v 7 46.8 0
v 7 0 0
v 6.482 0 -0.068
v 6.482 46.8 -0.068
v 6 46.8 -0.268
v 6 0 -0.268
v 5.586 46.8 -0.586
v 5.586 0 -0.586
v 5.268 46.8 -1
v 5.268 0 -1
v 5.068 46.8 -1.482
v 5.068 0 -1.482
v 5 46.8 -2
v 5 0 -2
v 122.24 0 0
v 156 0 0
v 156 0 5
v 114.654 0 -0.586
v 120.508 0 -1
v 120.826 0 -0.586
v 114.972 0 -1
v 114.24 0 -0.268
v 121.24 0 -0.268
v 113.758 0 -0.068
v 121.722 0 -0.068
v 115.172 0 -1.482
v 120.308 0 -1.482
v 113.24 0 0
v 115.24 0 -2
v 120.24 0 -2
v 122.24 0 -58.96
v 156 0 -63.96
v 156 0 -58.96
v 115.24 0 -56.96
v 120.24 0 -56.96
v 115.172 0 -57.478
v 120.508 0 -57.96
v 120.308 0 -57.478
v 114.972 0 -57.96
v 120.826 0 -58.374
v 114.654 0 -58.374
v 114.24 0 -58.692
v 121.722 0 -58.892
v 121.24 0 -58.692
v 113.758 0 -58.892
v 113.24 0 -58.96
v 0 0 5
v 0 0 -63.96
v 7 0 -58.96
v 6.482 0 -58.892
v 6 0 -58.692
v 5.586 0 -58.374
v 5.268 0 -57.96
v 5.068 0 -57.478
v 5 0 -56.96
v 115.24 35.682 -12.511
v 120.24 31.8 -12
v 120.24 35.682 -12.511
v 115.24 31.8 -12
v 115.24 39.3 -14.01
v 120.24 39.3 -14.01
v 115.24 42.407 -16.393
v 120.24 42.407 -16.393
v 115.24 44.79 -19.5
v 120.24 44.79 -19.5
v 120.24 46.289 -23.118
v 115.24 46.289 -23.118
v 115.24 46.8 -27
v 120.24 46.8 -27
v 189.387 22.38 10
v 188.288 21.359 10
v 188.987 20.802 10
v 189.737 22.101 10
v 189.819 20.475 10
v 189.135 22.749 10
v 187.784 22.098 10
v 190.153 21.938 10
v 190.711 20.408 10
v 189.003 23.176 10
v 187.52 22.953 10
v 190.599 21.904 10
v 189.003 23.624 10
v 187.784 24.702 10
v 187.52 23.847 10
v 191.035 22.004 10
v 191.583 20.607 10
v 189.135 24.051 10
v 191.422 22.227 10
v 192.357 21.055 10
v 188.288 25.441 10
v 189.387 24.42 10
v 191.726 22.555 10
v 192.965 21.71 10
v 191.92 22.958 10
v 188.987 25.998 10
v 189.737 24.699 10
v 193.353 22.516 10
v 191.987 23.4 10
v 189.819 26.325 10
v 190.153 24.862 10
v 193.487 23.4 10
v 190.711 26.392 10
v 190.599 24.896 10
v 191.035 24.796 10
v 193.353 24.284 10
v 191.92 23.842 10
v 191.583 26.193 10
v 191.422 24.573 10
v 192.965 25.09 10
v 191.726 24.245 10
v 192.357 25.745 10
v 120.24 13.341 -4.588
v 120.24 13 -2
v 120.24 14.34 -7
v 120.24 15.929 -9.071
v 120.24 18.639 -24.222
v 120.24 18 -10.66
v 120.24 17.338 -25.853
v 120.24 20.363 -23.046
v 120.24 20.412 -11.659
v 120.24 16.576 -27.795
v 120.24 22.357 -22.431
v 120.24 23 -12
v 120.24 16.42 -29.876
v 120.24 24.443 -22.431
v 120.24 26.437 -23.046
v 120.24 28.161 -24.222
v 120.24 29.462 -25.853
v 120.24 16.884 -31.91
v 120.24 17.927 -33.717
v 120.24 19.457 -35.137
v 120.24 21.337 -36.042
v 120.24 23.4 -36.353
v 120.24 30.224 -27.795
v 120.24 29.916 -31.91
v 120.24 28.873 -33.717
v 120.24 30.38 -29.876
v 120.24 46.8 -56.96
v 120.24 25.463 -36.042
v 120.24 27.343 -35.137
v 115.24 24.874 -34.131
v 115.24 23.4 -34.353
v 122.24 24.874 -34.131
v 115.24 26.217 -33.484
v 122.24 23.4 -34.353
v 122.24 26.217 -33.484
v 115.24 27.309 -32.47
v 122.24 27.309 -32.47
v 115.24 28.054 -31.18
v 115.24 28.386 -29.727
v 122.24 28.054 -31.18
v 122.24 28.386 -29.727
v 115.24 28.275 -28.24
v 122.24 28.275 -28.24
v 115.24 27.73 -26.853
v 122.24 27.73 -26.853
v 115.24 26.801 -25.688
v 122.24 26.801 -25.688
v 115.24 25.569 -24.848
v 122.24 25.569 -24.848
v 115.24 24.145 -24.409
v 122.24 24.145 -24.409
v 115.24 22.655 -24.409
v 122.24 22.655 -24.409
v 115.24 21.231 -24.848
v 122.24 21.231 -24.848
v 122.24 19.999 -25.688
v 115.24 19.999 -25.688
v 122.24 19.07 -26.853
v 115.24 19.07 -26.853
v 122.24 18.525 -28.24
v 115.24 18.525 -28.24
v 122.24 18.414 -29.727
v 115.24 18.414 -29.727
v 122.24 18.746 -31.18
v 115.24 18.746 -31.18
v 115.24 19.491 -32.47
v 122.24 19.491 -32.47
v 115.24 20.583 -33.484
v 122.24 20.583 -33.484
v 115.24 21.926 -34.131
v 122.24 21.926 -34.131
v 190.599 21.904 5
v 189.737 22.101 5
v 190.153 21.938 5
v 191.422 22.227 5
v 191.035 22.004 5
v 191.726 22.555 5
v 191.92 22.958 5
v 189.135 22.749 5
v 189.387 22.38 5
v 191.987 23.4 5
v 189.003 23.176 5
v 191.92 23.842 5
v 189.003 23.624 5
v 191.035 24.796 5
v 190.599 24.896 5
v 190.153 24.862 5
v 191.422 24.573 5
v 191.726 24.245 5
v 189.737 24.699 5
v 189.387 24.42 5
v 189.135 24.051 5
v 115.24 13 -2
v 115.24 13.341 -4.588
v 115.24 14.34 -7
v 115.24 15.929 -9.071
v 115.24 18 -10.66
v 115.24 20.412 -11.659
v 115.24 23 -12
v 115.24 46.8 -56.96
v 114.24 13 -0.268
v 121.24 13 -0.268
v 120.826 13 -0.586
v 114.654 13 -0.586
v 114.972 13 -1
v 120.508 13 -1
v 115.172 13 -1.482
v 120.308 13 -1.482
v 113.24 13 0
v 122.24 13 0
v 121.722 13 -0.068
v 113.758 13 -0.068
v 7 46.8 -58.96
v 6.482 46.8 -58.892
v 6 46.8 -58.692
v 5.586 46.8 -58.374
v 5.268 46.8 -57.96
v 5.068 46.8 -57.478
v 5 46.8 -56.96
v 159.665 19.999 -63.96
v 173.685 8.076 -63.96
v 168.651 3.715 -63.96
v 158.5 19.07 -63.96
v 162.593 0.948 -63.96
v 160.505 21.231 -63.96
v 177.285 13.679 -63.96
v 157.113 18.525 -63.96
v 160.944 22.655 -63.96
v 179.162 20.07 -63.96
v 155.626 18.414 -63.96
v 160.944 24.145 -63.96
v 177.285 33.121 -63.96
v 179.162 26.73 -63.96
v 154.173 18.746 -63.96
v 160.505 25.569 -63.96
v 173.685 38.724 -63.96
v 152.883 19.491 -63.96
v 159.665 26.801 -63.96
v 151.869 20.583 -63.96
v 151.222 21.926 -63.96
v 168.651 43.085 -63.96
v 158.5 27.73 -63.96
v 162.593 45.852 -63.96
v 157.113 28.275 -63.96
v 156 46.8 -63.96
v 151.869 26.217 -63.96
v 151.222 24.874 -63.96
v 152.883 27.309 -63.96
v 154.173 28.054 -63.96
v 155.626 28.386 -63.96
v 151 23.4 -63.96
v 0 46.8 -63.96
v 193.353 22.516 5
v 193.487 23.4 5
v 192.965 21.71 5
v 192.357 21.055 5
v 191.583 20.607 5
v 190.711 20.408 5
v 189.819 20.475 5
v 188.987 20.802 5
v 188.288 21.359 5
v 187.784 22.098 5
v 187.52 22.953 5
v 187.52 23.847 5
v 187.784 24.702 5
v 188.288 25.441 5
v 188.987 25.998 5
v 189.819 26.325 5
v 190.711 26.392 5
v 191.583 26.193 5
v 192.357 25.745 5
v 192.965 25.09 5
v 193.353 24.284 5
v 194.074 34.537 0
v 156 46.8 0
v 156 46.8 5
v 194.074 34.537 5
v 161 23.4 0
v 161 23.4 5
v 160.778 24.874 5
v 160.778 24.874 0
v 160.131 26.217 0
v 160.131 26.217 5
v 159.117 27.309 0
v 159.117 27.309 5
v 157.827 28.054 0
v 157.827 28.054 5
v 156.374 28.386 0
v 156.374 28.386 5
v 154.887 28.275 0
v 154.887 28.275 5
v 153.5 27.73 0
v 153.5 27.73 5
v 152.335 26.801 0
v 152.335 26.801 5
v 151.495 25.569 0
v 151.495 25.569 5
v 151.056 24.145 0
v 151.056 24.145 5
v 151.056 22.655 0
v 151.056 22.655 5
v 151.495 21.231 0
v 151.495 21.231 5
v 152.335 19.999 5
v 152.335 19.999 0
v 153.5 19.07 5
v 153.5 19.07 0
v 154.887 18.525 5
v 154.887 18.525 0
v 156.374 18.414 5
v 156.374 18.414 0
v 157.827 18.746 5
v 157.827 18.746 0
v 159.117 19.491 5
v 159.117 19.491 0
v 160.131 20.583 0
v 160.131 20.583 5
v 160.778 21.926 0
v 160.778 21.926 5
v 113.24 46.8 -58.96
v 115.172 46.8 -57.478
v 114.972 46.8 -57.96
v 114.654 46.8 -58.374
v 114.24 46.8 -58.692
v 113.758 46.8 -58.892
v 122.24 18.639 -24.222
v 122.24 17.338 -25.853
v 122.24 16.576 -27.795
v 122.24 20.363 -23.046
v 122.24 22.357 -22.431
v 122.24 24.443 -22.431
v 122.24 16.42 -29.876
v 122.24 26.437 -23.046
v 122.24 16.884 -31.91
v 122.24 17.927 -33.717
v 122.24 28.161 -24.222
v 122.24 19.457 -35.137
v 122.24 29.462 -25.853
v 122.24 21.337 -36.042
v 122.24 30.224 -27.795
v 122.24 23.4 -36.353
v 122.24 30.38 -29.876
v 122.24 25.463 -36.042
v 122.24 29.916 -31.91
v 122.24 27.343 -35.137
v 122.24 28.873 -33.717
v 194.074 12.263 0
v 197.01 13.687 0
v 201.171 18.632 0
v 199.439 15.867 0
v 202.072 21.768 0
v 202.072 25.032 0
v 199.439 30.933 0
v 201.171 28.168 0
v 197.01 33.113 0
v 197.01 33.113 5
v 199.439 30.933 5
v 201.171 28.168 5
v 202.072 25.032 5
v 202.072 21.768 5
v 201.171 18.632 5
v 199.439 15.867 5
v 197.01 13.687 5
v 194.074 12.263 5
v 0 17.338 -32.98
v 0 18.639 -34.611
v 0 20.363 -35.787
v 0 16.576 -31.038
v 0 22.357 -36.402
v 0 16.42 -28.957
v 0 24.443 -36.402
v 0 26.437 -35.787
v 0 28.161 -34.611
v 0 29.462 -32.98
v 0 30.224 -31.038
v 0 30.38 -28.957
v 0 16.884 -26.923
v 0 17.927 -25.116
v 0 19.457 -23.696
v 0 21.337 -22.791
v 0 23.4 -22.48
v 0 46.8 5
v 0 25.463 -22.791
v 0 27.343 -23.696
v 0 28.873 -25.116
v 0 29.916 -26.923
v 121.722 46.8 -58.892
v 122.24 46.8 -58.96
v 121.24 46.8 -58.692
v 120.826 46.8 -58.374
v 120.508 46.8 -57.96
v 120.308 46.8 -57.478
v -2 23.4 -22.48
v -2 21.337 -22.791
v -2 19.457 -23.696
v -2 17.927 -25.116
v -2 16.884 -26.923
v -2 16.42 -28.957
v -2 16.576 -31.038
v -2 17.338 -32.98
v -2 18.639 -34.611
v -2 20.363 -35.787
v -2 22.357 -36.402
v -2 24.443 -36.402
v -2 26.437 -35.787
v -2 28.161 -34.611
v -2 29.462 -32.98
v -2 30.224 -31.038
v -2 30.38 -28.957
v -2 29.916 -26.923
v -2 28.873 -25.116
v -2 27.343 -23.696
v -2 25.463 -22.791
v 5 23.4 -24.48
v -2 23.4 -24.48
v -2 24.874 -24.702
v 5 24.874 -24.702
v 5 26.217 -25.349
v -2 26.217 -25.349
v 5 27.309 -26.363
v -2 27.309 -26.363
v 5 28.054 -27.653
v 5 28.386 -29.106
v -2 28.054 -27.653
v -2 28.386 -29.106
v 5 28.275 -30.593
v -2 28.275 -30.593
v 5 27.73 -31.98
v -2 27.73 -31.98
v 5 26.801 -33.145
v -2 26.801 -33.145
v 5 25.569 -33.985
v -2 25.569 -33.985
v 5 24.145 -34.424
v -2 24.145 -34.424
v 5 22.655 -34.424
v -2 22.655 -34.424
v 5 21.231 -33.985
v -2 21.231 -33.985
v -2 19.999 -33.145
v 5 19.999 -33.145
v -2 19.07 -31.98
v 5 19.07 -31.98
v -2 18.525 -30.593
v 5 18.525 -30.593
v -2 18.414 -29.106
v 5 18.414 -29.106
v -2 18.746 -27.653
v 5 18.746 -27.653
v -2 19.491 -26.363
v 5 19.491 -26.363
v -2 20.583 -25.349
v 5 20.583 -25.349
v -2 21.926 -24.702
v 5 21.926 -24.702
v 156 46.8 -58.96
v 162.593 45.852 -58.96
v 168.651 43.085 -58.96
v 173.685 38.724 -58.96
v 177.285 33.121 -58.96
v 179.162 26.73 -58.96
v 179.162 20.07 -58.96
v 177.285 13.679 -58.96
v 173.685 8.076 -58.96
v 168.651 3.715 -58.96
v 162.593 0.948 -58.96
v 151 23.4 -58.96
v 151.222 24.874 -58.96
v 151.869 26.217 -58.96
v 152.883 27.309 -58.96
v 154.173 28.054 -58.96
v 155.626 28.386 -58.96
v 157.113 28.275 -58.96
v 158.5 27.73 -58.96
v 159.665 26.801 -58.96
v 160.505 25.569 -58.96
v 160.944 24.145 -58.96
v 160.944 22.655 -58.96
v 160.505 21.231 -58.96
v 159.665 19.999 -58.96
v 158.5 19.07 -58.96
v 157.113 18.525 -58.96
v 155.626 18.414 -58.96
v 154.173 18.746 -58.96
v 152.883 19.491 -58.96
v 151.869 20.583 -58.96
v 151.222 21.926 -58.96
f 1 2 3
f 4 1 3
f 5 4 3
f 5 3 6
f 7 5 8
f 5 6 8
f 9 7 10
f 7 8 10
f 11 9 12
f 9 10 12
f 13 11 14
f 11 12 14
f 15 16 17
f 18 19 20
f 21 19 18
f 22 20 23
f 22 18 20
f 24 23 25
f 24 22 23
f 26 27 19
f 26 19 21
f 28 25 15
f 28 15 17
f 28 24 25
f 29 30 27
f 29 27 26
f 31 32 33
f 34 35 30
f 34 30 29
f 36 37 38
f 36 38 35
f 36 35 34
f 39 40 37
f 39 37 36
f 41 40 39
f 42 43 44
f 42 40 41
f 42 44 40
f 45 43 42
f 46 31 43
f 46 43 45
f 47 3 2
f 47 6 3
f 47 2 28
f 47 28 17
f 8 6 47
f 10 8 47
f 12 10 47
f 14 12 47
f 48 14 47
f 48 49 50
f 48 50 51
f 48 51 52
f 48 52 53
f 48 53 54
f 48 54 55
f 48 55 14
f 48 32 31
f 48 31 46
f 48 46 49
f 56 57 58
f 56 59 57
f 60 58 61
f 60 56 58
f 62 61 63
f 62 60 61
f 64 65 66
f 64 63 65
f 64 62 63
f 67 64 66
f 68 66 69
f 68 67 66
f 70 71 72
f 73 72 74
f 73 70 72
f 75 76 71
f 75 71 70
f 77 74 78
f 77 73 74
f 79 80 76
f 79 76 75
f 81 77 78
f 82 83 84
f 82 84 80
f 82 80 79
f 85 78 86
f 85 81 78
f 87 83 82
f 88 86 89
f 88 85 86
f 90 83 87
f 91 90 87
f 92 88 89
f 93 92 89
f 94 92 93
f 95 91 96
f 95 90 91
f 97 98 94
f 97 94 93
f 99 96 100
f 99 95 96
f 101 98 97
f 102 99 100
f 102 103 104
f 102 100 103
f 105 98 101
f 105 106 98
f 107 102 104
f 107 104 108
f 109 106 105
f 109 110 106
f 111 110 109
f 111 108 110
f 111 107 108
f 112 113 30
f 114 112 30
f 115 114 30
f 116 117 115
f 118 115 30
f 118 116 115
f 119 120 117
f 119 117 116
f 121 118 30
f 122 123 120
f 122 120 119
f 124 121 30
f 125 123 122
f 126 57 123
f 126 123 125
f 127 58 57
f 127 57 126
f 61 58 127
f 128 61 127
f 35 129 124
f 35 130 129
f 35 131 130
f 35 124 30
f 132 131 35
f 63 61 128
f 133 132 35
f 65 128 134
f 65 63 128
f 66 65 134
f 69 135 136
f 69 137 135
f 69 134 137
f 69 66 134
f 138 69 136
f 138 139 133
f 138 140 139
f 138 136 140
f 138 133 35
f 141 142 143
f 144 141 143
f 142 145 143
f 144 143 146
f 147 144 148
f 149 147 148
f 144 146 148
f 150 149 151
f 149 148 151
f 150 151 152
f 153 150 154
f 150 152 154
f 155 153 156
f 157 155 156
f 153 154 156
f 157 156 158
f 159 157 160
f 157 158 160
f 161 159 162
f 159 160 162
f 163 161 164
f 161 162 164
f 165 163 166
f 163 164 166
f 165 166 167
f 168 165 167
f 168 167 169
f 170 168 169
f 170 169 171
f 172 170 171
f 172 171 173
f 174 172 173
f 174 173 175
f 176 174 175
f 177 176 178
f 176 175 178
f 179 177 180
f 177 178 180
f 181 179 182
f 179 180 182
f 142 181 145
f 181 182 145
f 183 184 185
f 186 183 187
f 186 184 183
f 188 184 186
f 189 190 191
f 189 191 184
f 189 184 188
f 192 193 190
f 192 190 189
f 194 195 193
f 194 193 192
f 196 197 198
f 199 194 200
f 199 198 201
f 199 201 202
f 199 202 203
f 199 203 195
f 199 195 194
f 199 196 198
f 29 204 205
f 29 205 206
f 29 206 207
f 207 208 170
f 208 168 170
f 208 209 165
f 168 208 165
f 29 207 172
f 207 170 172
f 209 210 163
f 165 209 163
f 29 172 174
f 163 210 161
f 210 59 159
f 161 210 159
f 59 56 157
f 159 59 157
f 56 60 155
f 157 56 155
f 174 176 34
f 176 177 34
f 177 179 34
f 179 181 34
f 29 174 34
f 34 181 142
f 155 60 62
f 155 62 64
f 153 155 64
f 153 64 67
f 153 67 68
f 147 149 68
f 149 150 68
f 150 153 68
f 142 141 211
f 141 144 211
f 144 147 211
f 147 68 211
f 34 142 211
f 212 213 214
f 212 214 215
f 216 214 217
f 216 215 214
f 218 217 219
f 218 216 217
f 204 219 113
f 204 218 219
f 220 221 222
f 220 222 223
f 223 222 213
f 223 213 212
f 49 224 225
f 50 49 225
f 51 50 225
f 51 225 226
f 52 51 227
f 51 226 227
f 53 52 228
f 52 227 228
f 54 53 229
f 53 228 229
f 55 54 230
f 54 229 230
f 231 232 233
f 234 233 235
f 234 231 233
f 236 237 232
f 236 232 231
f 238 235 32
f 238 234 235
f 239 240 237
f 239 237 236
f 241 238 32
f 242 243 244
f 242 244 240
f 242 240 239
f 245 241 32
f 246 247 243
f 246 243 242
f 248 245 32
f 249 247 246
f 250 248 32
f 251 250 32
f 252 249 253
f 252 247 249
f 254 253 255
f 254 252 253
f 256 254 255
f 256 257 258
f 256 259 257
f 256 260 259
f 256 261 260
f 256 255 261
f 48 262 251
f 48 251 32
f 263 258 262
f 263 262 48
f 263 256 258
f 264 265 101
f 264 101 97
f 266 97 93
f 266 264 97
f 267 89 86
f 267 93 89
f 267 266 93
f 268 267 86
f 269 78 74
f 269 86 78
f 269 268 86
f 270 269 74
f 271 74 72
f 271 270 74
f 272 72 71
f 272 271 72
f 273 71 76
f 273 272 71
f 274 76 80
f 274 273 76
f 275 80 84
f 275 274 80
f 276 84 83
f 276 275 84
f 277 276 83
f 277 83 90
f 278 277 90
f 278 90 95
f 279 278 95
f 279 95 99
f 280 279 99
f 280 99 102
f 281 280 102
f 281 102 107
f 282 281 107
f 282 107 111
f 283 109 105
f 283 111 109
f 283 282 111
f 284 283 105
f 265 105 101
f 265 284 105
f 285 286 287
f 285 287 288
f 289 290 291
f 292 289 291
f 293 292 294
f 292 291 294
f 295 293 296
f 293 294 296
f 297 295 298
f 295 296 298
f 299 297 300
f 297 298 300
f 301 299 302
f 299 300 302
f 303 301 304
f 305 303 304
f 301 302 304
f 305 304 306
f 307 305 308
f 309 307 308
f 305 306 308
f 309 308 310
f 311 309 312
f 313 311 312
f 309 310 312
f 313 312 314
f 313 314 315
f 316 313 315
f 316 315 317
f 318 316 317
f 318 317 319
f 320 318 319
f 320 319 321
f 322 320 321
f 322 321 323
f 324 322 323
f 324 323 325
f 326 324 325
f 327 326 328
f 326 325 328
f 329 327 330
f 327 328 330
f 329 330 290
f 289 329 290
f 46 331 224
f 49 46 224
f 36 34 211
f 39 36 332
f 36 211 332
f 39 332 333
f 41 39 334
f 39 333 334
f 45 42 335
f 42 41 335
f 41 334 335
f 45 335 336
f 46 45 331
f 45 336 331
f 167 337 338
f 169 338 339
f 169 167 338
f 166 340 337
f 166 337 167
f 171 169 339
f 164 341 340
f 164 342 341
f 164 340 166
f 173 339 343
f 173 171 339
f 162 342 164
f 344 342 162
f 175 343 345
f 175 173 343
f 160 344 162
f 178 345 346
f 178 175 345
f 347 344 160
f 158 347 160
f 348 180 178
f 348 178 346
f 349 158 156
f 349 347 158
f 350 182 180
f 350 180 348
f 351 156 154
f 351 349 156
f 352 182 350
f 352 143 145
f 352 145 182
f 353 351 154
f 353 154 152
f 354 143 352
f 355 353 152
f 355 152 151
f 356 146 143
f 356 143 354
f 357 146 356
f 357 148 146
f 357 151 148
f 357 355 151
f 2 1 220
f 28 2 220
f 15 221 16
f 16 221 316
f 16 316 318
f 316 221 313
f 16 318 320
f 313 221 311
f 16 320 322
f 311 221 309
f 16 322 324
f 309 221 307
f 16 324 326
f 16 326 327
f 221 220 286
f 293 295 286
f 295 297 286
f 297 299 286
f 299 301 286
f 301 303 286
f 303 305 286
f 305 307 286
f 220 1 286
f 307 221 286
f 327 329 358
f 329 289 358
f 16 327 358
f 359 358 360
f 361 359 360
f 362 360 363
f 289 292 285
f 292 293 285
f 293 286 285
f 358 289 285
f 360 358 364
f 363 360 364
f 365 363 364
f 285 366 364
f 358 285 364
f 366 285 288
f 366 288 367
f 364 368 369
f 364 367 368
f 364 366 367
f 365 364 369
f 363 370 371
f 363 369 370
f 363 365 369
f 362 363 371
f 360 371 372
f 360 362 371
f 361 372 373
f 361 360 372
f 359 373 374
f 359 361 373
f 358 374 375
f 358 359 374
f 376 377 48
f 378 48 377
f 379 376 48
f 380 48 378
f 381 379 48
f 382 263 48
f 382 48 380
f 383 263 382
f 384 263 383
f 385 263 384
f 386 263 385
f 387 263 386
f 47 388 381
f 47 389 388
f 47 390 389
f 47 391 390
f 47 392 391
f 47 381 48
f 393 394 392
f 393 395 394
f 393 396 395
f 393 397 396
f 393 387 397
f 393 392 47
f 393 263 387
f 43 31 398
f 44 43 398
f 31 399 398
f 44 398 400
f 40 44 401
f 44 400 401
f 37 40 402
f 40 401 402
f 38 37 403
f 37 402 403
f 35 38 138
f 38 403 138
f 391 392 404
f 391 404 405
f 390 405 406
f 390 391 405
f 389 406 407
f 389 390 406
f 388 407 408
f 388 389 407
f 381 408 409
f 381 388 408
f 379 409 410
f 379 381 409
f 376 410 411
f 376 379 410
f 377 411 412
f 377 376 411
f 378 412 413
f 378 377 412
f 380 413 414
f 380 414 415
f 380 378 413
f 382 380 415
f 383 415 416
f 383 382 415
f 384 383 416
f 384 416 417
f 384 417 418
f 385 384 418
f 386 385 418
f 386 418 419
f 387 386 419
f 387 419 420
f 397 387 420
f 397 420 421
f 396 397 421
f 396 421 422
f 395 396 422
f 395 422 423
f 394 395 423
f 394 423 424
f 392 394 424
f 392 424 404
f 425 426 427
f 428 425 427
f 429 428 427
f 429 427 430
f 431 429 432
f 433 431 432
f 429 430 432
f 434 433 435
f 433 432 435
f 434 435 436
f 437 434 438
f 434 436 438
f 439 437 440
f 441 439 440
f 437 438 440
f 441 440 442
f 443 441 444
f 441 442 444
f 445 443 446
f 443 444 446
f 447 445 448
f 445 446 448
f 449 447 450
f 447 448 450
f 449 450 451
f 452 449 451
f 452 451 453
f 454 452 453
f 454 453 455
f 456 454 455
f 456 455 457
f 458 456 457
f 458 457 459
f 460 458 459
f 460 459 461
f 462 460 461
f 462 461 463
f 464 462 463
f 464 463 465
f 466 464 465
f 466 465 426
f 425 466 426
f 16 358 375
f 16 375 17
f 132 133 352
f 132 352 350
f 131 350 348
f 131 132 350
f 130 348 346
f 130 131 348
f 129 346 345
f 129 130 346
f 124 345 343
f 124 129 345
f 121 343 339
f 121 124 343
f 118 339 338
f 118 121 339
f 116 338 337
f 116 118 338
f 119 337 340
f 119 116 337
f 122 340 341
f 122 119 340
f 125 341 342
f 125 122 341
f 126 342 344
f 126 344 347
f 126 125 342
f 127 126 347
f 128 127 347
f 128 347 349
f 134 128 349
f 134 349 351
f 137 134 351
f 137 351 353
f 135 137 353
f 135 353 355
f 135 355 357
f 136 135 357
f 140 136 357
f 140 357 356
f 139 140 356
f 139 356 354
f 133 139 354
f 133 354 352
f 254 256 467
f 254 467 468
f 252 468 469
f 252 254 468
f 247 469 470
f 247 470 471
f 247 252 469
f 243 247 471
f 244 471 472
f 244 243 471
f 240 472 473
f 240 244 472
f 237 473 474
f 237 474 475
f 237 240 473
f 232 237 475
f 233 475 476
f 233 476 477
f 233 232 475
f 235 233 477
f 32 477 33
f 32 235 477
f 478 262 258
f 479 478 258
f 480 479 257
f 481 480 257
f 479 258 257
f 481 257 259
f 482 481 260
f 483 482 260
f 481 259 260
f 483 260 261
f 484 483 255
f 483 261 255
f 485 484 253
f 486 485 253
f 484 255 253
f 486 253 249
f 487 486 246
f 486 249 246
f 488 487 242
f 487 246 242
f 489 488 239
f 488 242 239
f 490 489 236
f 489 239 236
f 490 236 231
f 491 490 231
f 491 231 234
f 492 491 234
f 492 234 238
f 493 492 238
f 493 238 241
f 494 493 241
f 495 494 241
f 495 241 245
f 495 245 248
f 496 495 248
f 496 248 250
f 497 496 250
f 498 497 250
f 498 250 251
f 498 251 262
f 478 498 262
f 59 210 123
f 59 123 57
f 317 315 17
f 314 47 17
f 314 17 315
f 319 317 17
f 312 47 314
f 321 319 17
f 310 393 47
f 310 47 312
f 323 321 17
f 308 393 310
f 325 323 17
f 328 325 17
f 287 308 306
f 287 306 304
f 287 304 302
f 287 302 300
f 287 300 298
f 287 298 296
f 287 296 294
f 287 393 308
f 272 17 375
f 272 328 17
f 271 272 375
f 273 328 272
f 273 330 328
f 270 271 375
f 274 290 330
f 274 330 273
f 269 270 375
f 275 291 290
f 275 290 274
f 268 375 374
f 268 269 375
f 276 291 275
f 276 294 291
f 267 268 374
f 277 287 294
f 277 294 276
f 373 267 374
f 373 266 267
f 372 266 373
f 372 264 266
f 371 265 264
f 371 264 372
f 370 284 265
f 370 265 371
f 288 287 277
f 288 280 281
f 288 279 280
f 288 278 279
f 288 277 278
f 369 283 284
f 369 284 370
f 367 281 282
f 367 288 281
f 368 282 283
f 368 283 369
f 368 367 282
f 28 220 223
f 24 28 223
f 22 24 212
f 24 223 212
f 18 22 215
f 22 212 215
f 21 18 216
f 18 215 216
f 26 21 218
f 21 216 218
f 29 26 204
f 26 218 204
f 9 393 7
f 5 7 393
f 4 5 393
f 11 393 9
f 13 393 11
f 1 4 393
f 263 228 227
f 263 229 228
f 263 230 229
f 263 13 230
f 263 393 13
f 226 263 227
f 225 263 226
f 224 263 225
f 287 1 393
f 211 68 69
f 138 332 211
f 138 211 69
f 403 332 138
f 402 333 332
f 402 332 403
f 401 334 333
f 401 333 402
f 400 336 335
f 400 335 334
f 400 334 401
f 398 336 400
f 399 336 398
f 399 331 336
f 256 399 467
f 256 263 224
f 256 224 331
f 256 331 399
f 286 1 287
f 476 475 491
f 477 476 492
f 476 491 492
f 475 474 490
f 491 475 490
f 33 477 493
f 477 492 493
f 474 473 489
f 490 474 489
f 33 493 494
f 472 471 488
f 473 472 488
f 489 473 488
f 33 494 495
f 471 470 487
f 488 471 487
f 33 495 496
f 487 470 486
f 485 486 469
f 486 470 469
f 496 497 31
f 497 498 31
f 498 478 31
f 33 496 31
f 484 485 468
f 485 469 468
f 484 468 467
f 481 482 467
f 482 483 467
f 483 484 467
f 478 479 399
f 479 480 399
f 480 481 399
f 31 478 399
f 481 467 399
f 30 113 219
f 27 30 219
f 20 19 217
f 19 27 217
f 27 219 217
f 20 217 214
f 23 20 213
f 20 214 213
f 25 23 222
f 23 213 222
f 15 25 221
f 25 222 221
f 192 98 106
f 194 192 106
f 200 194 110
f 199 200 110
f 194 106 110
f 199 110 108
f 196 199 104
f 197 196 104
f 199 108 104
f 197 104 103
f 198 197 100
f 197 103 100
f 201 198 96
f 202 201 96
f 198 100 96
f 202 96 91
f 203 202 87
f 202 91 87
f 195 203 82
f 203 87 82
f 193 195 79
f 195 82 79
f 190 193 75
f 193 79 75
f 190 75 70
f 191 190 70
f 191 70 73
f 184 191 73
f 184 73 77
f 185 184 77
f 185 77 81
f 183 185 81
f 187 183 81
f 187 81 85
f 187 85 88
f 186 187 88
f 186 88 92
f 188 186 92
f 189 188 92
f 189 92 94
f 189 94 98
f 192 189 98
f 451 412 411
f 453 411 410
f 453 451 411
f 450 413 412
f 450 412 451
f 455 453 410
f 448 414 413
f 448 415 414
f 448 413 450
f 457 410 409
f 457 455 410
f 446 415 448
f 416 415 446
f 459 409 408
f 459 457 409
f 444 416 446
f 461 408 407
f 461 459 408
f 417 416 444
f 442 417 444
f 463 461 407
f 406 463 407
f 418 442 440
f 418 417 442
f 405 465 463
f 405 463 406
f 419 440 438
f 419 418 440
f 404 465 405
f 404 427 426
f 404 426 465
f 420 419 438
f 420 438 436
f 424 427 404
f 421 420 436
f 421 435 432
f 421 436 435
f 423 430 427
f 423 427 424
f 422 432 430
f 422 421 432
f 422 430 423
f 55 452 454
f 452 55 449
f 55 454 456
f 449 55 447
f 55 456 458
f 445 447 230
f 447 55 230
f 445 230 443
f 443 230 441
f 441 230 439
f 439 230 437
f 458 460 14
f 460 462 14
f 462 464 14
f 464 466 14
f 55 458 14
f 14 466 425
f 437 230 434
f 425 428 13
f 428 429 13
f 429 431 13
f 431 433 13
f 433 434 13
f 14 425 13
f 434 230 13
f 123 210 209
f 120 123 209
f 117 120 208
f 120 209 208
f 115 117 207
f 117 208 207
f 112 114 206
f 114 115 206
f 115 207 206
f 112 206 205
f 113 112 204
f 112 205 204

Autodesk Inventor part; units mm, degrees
ref_plane "YZ Plane" through (0, 0, 0) normal (1, 0, 0) x (0, 1, 0)
ref_plane "XZ Plane" through (0, 0, 0) normal (0, 1, 0) x (-1, 0, 0)
ref_plane "XY Plane" through (0, 0, 0) normal (0, 0, 1) x (1, 0, 0)
sketch "Esquisse1" plane through (0, 0, 0) normal (0, 0, 1) x (1, 0, 0)
  point P0 (0, 0)
sketch "Esquisse2" plane through (0, 0, 0) normal (0, 0, 1) x (1, 0, 0)
  line L0 (0, 0) -> (156, 0)
  line L1 (0, 46.8) -> (0, 0)
  line L2 (194.0737, 12.2634) -> (156, 0)
  arc A0 (194.0737, 12.2634) -> (194.0737, 34.5366) centre (190.4867, 23.4) ccw
  line L3 (0, 46.8) -> (156, 46.8)
  line L4 (156, 46.8) -> (194.0737, 34.5366)
  dimension "d0" = 156
  dimension "d1" = 46.8
  dimension "d2" = 11.7
  dimension "d4" = 40
  dimension "d6" = 40
extrude "Extrusion1" add sketch "Esquisse2" along normal blind 5
sketch "Esquisse3" plane through (0, 0, 5) normal (0, 0, 1) x (1, 0, 0)
  line L0 (194.0737, 34.5366) -> (156, 46.8) projected
  line L1 (156, 46.8) -> (156, 0)
  circle A0 centre (156, 23.4) radius 5
  point P0 (0, 0)
  dimension "d11" = 23.4
  dimension "d12" = 10
extrude "Extrusion2" cut sketch "Esquisse3" against normal blind 5
sketch "Esquisse4" plane through (0, 0, 5) normal (0, 0, 1) x (1, 0, 0)
  point P0 (0, 0)
sketch "Esquisse5" plane through (0, 0, 5) normal (0, 0, 1) x (1, 0, 0)
  arc A0 (194.0737, 12.2634) -> (194.0737, 34.5366) centre (190.4867, 23.4) ccw projected
  circle A1 centre (190.4867, 23.4) radius 3
  point P0 (0, 0)
  point P1 (194.0737, 12.2634)
  dimension "d17" = 6
extrude "Extrusion3" add sketch "Esquisse5" along normal blind 5
sketch "Esquisse6" plane through (190.4867, 23.4, 10) normal (0, 0, 1) x (1, 0, 0)
  circle A0 centre (0, 0) radius 1.5
  point P0 (-190.4867, -23.4)
  dimension "d20" = 3
extrude "Extrusion4" cut sketch "Esquisse6" against normal blind 5
sketch "Esquisse7" plane through (0, 0, 0) normal (-1, 0, 0) x (0, 0, 1)
  line L0 (0, 0) -> (-63.96, 0)
  line L1 (-63.96, 0) -> (-63.96, 46.8)
  line L2 (-63.96, 46.8) -> (0, 46.8)
  line L3 (0, 46.8) -> (0, 0)
  dimension "d23" = 63.96
  dimension "d24" = 46.8
extrude "Extrusion5" add sketch "Esquisse7" against normal blind 5
sketch "Esquisse8" plane through (0, 0, 5) normal (-1, 0, 0) x (0, 0, 1)
  line L0 (-68.96, 46.8) -> (0, 46.8) projected
  line L1 (-68.96, 46.8) -> (0, 0)
  line L2 (0, 46.8) -> (-68.96, 0)
  circle A0 centre (-34.48, 23.4) radius 7
  point P0 (-5, 0)
  dimension "d27" = 14
extrude "Extrusion6" add sketch "Esquisse8" along normal blind 2 contours A0 L2 L1 | L1 L2 A0 | A0 L1 L2 | L1 A0 L2
sketch "Esquisse9" plane through (-2, 23.4, -29.48) normal (-1, 0, 0) x (0, 0, 1)
  circle A0 centre (0, 0) radius 5
  point P0 (29.48, -23.4)
  dimension "d30" = 10
extrude "Extrusion7" cut sketch "Esquisse9" against normal blind 7
sketch "Esquisse10" plane through (0, 0, -63.96) normal (0, 0, -1) x (-1, 0, 0)
  line L0 (-5, 0) -> (-5, 46.8) projected
  line L1 (-5, 46.8) -> (-156, 46.8)
  line L2 (-156, 0) -> (-5, 0)
  line L3 (-5, 0) -> (-5, 46.8)
  arc A0 (-156, 46.8) -> (-156, 0) centre (-156, 23.4) ccw
  point P0 (0, 0)
  dimension "d33" = 151
extrude "Extrusion8" add sketch "Esquisse10" against normal blind 5
sketch "Esquisse11" plane through (0, 0, -63.96) normal (0, 0, -1) x (-1, 0, 0)
  arc A0 (-156, 46.8) -> (-156, 0) centre (-156, 23.4) ccw projected
  circle A1 centre (-156, 23.4) radius 5
  point P0 (0, 0)
  dimension "d36" = 10
extrude "Extrusion9" cut sketch "Esquisse11" against normal blind 5
ref_plane "Plan de construction1" through (115.24, 0, 0) normal (1, 0, 0) x (0, 0, -1)
sketch "Esquisse12" plane through (115.24, 0, 0) normal (1, 0, 0) x (0, 0, -1)
  line L0 (0, 0) -> (0, 13)
  line L1 (0, 0) -> (0, 46.8) projected
  line L2 (0, 13) -> (2, 13)
  line L3 (0, 0) -> (58.96, 0)
  line L4 (58.96, 0) -> (58.96, 46.8)
  line L5 (12, 23) -> (12, 31.8)
  line L6 (27, 46.8) -> (58.96, 46.8)
  arc A0 (2, 13) -> (12, 23) centre (2, 23) ccw
  arc A1 (27, 46.8) -> (12, 31.8) centre (27, 31.8) ccw
  point P0 (12, 13)
  dimension "d40" = 13
  dimension "d41" = 12
  dimension "d42" = 46.8
  dimension "d44" = 10
  dimension "d45" = 15
extrude "Extrusion10" add sketch "Esquisse12" along normal blind 5
fillet "Congé1" radius 2 4 edges at (120.24, 6.5, 0) (120.24, 23.4, -58.96) (115.24, 23.4, -58.96) (115.24, 6.5, 0)
fillet "Congé2" radius 2 2 edges at (5, 23.4, 0) (5, 23.4, -58.96)
sketch "Esquisse13" plane through (120.24, 0, 0) normal (1, 0, 0) x (0, 0, -1)
  line L0 (63.96, 46.8) -> (-5, 46.8) projected
  line L1 (0, 46.8) -> (58.706, 0)
  line L2 (58.706, 46.8) -> (0, 0)
  circle A0 centre (29.353, 23.4) radius 7
  dimension "d51" = 14
extrude "Extrusion11" add sketch "Esquisse13" along normal blind 2 contours A0 L1 L2 | L2 L1 A0 | L1 L2 A0 | L1 A0 L2
sketch "Esquisse14" plane through (122.24, 23.4, -29.353) normal (1, 0, 0) x (0, 0, -1)
  circle A0 centre (0, 0) radius 5
  point P0 (-29.353, -23.4)
  dimension "d54" = 10
extrude "Extrusion12" cut sketch "Esquisse14" against normal blind 7
properties part number "Right forearm" material "Plastique ABS"
